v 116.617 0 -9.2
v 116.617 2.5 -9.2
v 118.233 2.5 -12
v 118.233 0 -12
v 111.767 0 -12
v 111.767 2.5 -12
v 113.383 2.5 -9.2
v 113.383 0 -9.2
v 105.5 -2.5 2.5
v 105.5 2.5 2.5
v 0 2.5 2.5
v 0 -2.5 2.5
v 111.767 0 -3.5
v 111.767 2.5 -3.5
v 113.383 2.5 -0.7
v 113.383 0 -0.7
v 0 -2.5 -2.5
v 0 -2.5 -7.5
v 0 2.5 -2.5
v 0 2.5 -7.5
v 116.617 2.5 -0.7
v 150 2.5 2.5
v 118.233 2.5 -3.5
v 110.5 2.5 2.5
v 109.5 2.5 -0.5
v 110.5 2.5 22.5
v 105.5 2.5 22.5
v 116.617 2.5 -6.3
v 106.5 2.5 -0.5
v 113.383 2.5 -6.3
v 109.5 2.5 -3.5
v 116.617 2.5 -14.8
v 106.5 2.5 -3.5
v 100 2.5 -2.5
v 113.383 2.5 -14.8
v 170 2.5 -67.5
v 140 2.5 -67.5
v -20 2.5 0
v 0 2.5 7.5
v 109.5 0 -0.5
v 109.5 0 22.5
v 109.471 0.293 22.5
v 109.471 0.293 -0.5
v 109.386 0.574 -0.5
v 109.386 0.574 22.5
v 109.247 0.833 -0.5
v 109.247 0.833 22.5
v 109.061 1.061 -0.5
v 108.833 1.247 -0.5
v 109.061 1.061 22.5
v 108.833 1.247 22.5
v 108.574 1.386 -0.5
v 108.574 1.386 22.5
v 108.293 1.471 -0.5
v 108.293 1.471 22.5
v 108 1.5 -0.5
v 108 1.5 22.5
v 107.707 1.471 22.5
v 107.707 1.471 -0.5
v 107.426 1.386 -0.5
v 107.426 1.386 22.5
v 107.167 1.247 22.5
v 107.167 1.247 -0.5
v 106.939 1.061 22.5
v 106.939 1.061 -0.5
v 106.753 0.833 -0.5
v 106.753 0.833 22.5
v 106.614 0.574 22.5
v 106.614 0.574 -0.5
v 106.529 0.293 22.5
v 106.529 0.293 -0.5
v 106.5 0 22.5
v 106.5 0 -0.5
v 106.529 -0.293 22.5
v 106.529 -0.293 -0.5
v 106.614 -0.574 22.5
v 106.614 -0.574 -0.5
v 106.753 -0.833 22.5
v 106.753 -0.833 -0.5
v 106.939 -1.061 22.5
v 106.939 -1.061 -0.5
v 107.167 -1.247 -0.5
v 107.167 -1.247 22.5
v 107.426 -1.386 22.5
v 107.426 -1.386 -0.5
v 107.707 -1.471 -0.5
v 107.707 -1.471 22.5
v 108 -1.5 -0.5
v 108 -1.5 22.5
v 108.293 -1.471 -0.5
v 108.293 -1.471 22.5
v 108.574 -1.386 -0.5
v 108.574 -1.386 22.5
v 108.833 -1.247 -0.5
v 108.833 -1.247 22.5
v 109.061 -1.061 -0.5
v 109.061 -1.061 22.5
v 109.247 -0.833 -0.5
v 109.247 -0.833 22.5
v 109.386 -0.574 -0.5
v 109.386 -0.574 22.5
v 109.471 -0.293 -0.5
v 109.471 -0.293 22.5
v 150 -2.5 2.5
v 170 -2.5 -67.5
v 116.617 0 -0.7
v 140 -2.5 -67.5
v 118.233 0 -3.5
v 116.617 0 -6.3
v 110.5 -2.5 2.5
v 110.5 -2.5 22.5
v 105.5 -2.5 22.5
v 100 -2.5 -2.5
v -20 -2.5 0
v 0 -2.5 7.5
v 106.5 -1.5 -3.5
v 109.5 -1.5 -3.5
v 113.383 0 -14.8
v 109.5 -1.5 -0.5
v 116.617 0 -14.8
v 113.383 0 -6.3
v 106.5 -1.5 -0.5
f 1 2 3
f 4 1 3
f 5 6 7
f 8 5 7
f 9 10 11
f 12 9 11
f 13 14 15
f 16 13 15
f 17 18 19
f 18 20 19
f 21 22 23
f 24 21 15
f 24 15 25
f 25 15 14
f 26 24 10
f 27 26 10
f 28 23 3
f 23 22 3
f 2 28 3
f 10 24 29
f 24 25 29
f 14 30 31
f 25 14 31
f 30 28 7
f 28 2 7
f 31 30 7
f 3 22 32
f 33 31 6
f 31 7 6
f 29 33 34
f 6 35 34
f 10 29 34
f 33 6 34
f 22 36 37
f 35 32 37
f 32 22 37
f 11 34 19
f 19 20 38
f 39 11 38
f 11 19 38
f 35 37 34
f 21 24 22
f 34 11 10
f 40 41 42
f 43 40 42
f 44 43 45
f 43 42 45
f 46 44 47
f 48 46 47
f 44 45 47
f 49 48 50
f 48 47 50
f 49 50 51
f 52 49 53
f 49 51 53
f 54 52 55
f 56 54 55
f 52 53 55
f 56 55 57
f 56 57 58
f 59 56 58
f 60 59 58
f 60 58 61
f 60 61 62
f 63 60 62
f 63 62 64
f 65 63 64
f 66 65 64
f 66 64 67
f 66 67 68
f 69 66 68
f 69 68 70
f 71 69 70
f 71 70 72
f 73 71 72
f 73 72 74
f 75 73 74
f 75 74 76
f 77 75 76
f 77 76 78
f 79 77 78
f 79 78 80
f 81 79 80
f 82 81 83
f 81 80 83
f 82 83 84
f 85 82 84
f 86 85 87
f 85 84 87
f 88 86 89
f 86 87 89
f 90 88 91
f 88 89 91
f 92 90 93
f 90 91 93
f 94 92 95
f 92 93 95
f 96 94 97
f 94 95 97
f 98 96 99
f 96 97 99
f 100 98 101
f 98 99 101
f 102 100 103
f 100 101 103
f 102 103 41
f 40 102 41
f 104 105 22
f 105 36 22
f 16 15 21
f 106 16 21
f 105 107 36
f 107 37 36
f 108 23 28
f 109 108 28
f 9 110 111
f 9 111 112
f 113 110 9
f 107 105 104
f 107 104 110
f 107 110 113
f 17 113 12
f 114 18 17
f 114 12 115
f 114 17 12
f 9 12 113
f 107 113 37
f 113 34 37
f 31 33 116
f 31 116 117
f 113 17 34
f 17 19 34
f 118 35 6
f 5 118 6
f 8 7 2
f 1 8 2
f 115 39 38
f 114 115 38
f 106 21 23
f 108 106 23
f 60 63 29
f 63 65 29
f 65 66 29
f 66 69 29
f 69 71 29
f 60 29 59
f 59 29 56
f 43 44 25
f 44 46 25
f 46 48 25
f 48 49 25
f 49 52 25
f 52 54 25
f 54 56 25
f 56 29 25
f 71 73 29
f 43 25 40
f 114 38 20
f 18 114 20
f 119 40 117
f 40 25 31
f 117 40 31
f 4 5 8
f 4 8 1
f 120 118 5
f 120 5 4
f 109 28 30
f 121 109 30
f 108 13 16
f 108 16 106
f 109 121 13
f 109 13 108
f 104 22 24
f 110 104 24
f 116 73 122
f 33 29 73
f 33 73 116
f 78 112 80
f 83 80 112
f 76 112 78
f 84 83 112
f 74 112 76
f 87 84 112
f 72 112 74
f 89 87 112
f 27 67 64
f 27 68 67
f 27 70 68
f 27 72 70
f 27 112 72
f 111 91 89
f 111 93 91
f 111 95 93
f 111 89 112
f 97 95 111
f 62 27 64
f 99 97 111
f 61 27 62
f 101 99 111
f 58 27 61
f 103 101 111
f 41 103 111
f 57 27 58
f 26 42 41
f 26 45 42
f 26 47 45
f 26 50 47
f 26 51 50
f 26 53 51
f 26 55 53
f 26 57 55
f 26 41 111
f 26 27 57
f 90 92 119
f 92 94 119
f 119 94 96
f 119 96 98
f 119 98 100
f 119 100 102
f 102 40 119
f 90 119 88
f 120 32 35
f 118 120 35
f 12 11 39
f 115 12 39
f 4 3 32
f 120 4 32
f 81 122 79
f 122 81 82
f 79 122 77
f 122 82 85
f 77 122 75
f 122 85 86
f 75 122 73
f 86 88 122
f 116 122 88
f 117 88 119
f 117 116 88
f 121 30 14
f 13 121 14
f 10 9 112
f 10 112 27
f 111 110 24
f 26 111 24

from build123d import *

# Parameters (mm, degrees)
BOSS_EXTRUDE1_DEPTH = 2.5
CUT_EXTRUDE2_DEPTH  = 2.5
SKETCH3_W           = 5
SKETCH3_H           = 5
BOSS_EXTRUDE2_DEPTH = 20
SKETCH4_R           = 1.5
CUT_EXTRUDE3_DEPTH  = 23
SKETCH6_W           = 3
SKETCH6_H           = 3
CUT_EXTRUDE5_DEPTH  = 4


with BuildPart() as part:
    # Sketch1 → Boss-Extrude1 (new, symmetric)
    with BuildSketch(Plane(origin=(0, 0, 0), x_dir=(1, 0, 0), z_dir=(0, 1, 0))):
        Polygon((-20, 0), (0, 7.5), (0, 2.5), (100, 2.5), (140, 67.5), (170, 67.5), (150, -2.5), (0, -2.5), (0, -7.5), align=None)
    extrude(amount=BOSS_EXTRUDE1_DEPTH, both=True)

    # Sketch2 → Cut-Extrude2 (cut)
    with BuildSketch(Plane(origin=(0, 2.5, 0), x_dir=(1, 0, 0), z_dir=(0, 1, 0))):
        Polygon((118.233161507, 12), (116.616580754, 14.8), (113.383419246, 14.8), (111.766838493, 12), (113.383419246, 9.2), (116.616580754, 9.2), align=None)
        Polygon((118.233161507, 3.5), (116.616580754, 6.3), (113.383419246, 6.3), (111.766838493, 3.5), (113.383419246, 0.7), (116.616580754, 0.7), align=None)
    extrude(amount=-CUT_EXTRUDE2_DEPTH, mode=Mode.SUBTRACT)

    # Sketch3 → Boss-Extrude2 (add)
    with BuildSketch(Plane.XY.offset(2.5)):
        with Locations((108, 0)):
            Rectangle(SKETCH3_W, SKETCH3_H)
    extrude(amount=BOSS_EXTRUDE2_DEPTH)

    # Sketch4 → Cut-Extrude3 (cut)
    with BuildSketch(Plane.XY.offset(22.5)):
        with Locations((108, 0)):
            Circle(SKETCH4_R)
    extrude(amount=-CUT_EXTRUDE3_DEPTH, mode=Mode.SUBTRACT)

    # Sketch6 → Cut-Extrude5 (cut)
    with BuildSketch(Plane(origin=(0, 2.5, 0), x_dir=(1, 0, 0), z_dir=(0, 1, 0))):
        with Locations((108, 2)):
            Rectangle(SKETCH6_W, SKETCH6_H)
    extrude(amount=-CUT_EXTRUDE5_DEPTH, mode=Mode.SUBTRACT)


solid = part.part
